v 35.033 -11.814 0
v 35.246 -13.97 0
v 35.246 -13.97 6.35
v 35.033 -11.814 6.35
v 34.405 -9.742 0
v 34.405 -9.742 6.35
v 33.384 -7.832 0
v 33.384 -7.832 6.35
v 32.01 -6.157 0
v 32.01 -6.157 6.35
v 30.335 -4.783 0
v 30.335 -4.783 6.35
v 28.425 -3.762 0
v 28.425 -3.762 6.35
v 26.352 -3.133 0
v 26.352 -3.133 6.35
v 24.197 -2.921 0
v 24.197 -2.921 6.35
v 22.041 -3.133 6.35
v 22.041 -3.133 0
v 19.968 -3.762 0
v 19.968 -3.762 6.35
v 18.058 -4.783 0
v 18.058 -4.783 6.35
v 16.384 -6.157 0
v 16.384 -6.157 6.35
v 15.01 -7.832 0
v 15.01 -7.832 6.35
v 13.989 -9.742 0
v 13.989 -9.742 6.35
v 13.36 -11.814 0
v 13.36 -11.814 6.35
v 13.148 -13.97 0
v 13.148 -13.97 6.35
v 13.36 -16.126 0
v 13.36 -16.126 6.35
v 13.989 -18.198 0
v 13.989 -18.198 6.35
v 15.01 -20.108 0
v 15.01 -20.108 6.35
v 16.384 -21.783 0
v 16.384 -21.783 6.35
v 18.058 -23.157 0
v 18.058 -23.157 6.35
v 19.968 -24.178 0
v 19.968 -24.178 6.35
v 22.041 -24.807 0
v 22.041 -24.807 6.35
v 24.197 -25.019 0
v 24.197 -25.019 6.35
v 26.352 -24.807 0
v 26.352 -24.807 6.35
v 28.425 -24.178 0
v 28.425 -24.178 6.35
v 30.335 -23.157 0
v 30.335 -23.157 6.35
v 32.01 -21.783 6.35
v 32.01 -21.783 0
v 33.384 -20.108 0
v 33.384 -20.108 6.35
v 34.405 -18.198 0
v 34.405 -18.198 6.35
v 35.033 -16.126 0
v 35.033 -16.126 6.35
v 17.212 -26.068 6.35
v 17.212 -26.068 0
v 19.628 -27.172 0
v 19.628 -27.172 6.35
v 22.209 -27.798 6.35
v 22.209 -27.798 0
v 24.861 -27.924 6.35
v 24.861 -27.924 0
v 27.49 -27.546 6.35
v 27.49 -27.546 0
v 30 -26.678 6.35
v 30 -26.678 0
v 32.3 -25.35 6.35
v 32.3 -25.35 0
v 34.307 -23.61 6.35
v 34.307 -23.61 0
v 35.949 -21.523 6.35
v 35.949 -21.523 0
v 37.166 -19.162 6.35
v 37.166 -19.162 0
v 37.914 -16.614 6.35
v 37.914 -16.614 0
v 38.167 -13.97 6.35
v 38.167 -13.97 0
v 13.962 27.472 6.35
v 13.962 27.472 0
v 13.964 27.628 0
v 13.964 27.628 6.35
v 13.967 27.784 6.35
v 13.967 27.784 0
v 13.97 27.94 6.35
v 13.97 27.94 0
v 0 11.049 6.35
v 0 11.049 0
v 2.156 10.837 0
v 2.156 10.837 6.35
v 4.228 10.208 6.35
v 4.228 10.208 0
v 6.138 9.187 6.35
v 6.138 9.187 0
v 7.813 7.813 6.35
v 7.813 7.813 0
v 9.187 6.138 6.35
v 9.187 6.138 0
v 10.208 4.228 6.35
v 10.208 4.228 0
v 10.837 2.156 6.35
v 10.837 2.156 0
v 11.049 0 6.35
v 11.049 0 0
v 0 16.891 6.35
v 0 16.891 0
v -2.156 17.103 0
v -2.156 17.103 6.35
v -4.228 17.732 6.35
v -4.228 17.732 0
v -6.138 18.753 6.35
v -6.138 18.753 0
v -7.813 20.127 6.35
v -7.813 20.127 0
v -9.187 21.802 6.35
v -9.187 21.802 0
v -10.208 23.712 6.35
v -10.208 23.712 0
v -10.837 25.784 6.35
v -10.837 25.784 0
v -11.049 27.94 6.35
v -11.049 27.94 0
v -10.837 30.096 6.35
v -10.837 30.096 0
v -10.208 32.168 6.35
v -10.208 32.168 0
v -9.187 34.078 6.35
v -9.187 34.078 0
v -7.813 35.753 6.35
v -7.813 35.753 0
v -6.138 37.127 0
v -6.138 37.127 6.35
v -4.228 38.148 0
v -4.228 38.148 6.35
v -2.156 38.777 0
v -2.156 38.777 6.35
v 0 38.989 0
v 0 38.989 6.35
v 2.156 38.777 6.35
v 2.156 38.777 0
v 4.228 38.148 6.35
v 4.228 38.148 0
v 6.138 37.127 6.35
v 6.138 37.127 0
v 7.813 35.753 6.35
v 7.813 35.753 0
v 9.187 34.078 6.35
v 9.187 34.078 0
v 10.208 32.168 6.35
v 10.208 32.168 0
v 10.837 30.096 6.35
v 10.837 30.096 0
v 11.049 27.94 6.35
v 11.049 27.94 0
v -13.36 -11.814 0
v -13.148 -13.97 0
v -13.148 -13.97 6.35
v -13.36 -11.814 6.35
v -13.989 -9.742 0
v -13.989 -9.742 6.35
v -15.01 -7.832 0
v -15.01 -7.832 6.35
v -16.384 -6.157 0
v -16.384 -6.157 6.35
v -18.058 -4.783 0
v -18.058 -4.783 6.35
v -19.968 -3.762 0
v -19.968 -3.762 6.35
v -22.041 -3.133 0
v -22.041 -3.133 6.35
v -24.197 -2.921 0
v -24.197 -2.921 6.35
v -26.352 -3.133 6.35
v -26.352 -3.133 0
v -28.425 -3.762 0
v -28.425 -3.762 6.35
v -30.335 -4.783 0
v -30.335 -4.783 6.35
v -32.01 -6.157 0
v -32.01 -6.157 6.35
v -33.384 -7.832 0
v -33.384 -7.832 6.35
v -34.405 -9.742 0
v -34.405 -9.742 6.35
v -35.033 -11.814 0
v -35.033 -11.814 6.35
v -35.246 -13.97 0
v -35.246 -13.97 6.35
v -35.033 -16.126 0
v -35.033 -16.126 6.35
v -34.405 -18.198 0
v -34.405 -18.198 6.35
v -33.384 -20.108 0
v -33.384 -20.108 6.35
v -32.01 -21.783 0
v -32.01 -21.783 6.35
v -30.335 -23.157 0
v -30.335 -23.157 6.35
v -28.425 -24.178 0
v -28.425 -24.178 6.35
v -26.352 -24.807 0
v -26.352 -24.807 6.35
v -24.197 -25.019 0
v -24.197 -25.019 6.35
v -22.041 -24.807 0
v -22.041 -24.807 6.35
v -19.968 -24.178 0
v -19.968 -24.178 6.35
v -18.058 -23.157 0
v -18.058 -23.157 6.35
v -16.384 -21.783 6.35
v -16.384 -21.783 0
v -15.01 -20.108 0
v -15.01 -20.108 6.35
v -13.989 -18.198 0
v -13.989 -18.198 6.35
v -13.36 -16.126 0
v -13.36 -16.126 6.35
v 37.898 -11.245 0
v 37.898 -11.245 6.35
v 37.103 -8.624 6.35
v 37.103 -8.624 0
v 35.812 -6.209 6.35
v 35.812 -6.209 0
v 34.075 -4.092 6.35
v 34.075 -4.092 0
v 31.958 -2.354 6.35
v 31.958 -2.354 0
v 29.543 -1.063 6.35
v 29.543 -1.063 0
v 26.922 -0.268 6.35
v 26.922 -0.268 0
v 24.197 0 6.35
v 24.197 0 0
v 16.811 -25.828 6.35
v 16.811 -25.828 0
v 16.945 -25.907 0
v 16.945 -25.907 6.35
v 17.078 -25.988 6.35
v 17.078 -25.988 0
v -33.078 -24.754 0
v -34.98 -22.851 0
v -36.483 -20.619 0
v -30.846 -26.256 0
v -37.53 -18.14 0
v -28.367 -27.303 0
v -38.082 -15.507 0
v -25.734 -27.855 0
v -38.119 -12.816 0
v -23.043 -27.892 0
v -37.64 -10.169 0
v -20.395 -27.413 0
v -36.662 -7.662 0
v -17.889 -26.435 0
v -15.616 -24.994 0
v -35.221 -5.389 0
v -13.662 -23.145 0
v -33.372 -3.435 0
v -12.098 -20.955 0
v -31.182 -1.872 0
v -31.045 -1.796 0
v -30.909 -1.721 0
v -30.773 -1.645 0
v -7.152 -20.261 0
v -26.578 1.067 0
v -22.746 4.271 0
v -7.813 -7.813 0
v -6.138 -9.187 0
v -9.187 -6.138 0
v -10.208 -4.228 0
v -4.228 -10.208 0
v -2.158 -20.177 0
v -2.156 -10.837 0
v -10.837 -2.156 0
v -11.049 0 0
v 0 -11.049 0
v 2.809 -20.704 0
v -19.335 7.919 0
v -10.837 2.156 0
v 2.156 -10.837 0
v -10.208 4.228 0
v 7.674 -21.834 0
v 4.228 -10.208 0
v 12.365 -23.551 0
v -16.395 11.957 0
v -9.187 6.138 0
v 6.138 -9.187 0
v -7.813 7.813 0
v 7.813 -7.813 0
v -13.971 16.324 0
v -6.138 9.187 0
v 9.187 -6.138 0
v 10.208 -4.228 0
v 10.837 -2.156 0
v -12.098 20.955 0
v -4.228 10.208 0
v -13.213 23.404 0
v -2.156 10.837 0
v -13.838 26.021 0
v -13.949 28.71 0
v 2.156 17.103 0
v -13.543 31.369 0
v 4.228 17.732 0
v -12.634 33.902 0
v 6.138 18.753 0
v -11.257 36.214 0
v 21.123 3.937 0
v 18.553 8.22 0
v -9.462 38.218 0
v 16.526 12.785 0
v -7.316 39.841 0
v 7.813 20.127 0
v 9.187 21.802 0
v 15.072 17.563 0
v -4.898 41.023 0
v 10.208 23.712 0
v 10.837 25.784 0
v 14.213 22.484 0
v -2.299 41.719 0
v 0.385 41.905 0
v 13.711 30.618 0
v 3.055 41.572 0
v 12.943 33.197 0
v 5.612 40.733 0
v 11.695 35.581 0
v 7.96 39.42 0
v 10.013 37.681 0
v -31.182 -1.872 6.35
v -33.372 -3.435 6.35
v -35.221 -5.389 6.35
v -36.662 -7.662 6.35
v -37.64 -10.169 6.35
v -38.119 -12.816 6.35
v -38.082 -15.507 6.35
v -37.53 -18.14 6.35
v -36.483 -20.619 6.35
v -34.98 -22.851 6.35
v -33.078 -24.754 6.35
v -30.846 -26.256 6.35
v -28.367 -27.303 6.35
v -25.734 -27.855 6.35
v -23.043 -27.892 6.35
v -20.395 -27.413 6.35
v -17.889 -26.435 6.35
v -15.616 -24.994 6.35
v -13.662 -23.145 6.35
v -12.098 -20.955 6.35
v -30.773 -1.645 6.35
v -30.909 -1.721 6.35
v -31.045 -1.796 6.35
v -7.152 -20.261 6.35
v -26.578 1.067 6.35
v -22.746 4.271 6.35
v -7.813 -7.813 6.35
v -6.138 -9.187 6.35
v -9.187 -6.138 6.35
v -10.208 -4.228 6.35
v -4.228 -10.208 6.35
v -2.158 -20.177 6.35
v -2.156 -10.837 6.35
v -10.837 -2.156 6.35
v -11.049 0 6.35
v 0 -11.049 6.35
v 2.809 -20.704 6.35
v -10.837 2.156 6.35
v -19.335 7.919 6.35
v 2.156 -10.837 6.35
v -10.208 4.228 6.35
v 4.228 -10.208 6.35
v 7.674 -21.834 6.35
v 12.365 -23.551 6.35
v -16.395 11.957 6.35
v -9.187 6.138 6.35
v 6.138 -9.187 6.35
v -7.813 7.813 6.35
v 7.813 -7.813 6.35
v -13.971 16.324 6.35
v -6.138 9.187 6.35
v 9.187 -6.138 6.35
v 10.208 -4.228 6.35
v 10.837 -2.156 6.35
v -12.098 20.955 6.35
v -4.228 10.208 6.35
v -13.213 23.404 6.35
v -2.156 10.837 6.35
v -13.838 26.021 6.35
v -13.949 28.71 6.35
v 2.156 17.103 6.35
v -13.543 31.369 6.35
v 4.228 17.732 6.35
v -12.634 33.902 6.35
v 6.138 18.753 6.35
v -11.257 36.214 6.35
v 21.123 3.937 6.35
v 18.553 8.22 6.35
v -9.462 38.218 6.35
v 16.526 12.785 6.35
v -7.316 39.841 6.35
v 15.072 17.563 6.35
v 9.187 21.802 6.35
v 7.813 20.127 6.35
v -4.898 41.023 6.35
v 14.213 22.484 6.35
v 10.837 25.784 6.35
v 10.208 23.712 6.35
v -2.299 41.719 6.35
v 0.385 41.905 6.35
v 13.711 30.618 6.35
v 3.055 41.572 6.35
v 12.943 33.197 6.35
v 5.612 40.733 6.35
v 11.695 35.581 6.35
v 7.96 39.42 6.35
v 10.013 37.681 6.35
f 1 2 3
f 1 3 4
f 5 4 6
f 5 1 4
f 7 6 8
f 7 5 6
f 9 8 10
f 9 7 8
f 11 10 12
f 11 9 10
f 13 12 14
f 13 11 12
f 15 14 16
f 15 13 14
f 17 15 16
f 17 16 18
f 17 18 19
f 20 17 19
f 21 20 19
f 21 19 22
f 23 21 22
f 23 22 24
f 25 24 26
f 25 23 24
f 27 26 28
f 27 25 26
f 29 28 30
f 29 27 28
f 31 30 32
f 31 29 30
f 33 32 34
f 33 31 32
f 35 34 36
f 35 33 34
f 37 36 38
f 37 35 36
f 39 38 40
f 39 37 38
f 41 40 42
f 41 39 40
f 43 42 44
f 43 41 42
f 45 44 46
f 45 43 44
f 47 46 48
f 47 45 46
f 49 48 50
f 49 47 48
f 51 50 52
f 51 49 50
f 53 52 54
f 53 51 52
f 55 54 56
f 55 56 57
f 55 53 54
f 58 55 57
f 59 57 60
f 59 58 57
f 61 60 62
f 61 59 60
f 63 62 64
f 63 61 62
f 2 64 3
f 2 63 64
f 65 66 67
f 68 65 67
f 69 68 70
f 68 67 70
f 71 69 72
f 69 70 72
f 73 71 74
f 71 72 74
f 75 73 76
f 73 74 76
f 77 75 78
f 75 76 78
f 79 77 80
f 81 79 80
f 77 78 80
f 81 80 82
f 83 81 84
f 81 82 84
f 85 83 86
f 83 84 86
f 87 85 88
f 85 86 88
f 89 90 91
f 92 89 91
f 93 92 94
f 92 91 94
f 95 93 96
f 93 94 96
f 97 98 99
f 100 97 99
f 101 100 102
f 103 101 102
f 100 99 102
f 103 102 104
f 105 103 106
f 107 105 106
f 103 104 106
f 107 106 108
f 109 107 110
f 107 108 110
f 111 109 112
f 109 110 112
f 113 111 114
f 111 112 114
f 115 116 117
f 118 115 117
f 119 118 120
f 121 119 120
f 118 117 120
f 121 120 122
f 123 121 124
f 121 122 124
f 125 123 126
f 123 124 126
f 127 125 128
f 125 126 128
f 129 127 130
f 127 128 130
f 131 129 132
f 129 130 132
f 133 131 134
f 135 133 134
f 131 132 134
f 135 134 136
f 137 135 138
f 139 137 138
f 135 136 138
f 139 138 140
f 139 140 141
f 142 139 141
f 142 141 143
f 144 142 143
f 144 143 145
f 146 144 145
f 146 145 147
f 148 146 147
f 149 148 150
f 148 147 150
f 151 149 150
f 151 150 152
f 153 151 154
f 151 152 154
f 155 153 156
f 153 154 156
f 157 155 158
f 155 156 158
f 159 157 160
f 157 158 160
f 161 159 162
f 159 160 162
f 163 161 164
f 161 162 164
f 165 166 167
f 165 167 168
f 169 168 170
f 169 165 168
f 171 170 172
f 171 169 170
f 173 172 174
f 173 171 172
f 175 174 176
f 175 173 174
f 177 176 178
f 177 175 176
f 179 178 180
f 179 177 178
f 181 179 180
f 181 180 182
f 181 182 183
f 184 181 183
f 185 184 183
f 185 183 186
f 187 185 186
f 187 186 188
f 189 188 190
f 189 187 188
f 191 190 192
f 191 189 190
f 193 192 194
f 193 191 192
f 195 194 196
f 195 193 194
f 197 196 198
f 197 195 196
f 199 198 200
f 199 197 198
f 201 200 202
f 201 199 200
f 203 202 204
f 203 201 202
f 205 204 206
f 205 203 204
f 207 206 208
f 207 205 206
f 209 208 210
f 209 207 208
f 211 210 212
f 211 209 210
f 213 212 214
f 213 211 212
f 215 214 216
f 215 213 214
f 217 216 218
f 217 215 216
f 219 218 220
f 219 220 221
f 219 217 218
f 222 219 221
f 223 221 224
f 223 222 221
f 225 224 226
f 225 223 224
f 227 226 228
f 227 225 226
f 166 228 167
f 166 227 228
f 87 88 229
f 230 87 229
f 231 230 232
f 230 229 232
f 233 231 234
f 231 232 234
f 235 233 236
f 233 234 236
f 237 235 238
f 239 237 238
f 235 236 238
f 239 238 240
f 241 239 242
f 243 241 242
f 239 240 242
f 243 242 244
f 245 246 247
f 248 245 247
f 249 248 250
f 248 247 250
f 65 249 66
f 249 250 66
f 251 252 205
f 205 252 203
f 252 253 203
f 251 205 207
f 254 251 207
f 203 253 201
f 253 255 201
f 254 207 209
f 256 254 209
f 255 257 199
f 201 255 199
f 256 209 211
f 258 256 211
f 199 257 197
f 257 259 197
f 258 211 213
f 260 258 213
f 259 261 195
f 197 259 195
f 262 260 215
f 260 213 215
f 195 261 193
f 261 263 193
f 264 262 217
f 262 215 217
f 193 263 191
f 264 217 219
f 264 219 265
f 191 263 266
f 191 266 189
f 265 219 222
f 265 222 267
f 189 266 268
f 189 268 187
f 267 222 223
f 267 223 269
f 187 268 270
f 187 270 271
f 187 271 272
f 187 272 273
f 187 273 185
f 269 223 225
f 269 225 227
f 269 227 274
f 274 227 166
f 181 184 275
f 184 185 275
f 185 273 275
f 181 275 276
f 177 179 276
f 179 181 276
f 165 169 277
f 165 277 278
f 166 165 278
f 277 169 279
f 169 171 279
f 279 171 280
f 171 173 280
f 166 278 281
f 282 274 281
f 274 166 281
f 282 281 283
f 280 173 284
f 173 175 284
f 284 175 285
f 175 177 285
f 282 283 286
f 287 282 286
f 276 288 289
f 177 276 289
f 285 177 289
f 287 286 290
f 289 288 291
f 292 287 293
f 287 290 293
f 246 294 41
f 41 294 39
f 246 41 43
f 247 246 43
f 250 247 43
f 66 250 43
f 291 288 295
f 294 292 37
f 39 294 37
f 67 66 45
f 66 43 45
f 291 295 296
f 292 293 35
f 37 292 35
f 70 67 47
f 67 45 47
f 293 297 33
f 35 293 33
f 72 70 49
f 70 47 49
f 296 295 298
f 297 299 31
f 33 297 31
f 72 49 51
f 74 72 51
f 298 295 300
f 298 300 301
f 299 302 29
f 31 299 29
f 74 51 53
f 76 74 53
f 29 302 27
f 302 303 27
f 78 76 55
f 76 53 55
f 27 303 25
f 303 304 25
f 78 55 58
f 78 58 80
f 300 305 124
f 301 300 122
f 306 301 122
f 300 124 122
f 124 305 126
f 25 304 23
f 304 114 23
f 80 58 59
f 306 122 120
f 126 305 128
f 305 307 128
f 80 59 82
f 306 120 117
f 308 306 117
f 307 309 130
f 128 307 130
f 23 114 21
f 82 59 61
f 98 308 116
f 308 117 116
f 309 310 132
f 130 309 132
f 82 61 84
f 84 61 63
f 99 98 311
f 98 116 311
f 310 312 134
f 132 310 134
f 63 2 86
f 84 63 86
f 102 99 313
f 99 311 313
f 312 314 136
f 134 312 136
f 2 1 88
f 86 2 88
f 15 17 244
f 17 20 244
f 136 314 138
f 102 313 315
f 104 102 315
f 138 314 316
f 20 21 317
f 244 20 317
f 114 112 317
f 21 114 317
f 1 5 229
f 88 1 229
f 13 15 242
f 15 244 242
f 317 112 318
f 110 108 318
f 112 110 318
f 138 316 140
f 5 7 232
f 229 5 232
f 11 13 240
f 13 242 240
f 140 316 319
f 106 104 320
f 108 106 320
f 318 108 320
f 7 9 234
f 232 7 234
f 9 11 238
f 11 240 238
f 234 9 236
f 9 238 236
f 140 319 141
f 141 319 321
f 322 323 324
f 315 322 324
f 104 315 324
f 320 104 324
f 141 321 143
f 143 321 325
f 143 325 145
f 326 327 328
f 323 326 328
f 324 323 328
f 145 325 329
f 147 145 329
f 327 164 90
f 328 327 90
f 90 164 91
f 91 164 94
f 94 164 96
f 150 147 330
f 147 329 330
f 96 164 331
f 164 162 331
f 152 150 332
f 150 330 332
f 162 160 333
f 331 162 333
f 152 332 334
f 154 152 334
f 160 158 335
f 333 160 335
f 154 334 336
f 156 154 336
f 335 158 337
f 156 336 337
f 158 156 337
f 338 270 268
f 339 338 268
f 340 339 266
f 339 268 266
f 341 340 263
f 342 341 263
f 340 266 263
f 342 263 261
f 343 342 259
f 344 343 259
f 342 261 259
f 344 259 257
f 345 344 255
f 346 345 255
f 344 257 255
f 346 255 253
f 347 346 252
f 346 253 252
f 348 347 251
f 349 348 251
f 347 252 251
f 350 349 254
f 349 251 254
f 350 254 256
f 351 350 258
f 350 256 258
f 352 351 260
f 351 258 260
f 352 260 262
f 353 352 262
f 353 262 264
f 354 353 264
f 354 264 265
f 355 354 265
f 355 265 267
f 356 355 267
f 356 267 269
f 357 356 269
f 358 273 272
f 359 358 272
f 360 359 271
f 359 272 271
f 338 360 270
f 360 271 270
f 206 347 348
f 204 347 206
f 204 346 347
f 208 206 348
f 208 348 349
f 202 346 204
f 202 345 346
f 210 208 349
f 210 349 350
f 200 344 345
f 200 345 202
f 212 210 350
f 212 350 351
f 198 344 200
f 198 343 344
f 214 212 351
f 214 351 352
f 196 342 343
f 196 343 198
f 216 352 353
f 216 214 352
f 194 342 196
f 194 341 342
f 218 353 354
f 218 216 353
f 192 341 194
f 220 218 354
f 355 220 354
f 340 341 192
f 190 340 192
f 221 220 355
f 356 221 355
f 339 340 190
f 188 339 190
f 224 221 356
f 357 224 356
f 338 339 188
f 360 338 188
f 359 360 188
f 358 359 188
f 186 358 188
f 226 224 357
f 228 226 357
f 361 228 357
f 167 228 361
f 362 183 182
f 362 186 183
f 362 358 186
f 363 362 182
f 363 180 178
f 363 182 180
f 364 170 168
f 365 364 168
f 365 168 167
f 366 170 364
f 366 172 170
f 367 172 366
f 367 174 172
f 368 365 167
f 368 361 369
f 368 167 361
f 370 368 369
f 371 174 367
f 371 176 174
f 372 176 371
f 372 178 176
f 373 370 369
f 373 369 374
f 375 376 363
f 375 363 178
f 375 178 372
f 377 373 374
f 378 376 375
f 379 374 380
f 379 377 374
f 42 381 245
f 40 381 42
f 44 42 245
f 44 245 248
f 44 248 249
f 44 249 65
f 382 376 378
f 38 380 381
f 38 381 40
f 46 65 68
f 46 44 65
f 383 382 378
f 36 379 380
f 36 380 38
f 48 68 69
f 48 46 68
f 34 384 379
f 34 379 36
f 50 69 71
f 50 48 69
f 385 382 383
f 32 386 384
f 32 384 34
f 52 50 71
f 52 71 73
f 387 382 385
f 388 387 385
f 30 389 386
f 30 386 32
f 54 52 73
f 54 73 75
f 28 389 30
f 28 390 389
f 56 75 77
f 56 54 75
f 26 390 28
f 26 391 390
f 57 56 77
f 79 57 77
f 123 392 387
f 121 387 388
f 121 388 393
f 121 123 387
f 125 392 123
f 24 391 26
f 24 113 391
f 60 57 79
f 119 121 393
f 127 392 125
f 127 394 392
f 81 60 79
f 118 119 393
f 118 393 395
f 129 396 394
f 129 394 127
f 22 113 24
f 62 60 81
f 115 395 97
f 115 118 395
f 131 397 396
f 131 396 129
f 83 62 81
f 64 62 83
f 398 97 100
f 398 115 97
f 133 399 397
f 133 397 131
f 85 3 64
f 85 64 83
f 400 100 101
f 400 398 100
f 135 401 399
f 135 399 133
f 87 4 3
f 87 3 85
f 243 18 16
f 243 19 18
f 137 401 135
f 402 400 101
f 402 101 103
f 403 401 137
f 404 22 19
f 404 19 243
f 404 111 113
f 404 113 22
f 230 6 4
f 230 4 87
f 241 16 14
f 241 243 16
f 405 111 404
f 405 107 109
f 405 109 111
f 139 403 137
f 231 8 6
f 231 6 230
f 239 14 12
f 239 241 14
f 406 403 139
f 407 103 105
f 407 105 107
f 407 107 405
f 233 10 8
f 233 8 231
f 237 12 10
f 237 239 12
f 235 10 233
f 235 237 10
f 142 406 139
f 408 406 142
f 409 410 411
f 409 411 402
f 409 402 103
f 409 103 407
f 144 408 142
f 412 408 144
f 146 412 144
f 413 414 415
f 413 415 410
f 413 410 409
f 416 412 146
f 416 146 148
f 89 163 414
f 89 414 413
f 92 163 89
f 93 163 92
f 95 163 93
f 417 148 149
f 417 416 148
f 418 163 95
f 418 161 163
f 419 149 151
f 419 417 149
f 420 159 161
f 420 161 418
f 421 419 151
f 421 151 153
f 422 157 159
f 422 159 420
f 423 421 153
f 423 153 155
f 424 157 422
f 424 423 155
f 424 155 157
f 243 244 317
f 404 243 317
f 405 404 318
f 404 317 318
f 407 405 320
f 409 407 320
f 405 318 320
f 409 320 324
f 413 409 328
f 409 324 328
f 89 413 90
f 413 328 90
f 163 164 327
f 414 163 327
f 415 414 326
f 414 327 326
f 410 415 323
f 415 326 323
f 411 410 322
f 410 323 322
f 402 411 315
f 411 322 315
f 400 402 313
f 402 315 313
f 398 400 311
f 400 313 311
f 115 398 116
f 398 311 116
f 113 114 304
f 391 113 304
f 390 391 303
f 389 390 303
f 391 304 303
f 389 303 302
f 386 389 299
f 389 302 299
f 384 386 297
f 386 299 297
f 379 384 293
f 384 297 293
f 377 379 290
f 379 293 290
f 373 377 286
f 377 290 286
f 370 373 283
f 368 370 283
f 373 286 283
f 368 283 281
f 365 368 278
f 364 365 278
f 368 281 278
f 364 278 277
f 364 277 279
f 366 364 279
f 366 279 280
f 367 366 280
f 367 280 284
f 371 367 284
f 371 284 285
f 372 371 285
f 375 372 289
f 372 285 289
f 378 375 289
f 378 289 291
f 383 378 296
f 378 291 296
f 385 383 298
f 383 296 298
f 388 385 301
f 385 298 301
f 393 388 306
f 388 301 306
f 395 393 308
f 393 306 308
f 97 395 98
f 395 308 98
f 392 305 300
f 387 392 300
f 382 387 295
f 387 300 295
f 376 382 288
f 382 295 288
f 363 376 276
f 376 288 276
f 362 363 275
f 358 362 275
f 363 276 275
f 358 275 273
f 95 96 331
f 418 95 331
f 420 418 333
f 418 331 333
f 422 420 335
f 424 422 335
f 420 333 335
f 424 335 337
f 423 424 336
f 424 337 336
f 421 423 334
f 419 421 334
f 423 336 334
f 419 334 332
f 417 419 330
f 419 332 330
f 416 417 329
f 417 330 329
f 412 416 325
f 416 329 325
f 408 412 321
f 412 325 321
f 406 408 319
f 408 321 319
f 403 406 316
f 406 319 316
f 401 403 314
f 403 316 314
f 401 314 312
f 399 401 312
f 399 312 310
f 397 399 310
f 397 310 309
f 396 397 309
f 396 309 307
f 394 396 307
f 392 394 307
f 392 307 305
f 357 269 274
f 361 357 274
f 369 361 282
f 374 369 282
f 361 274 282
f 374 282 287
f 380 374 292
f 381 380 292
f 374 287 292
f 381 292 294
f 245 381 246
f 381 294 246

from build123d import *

# Parameters (mm, degrees)
F1_R     = 11.049
F2_DEPTH = 6.35


with BuildPart() as f2:
    # F1 (on face) → F2 (new body)
    with BuildSketch(Plane.XY):
        with BuildLine():
            ThreePointArc((13.9621660883, 27.472220007), (13.9654123098, 27.7061212363), (13.97, 27.94))
            ThreePointArc((13.97, 27.94), (-3.6157020601, 41.4339837933), (-12.0983748909, 20.955))
            ThreePointArc((-12.0983748909, 20.955), (-6.9849999951, 15.8416251063), (1.14e-08, 13.97))
            ThreePointArc((1.14e-08, 13.97), (9.7114883941, 17.8976948278), (13.9621660883, 27.472220007))
        make_face()
        with BuildLine():
            ThreePointArc((11.049, 27.94), (7.8128228253, 20.1271771747), (0, 16.891))
            ThreePointArc((0, 16.891), (-7.8128228253, 35.7528228253), (11.049, 27.94))
        make_face(mode=Mode.SUBTRACT)
        with BuildLine():
            ThreePointArc((1.14e-08, 13.97), (-6.9849999951, 15.8416251063), (-12.0983748909, 20.955))
            ThreePointArc((-12.0983748909, 20.955), (-19.3348001595, 7.9193573575), (-30.7727234686, -1.6445194791))
            ThreePointArc((-30.7727234686, -1.6445194791), (-20.3556031034, -0.5384516084), (-12.0983754336, -6.98499906))
            ThreePointArc((-12.0983754336, -6.98499906), (-12.0983746167, 6.9850004749), (1.14e-08, 13.97))
        make_face()
        with BuildLine():
            ThreePointArc((24.1967497817, 0), (16.525764733, 12.7847494365), (13.9621660883, 27.472220007))
            ThreePointArc((13.9621660883, 27.472220007), (9.7114883941, 17.8976948278), (1.14e-08, 13.97))
            ThreePointArc((1.14e-08, 13.97), (9.8782817372, 9.8782817292), (13.97, 0))
            ThreePointArc((13.97, 0), (13.4939839355, -3.6157015292), (12.0983754405, -6.984999048))
            ThreePointArc((12.0983754405, -6.984999048), (17.2117502577, -1.8716248343), (24.1967497817, 0))
        make_face()
        with BuildLine():
            ThreePointArc((13.97, 0), (9.8782817372, 9.8782817292), (1.14e-08, 13.97))
            ThreePointArc((1.14e-08, 13.97), (-12.0983746167, 6.9850004749), (-12.0983754336, -6.98499906))
            ThreePointArc((-12.0983754336, -6.98499906), (6.9e-09, -13.97), (12.0983754405, -6.984999048))
            ThreePointArc((12.0983754405, -6.984999048), (13.4939839355, -3.6157015292), (13.97, 0))
        make_face()
        with BuildLine():
            ThreePointArc((11.049, 0), (-7.8128228253, -7.8128228253), (0, 11.049))
            ThreePointArc((0, 11.049), (7.8128228253, 7.8128228253), (11.049, 0))
        make_face(mode=Mode.SUBTRACT)
        with BuildLine():
            ThreePointArc((-12.0983754336, -6.98499906), (-20.3556031034, -0.5384516084), (-30.7727234686, -1.6445194791))
            ThreePointArc((-30.7727234686, -1.6445194791), (-30.9769109858, -1.7586587835), (-31.1817497817, -1.8716251091))
            ThreePointArc((-31.1817497817, -1.8716251091), (-34.0750315149, -23.8482817332), (-12.0983748909, -20.955))
            ThreePointArc((-12.0983748909, -20.955), (-10.7027659885, -17.5857020601), (-10.2267497817, -13.97))
            ThreePointArc((-10.2267497817, -13.97), (-10.7027661289, -10.3542974157), (-12.0983754336, -6.98499906))
        make_face()
        with Locations((-24.1967497817, -13.97)):
            Circle(F1_R, mode=Mode.SUBTRACT)
        with BuildLine():
            ThreePointArc((38.1667497817, -13.97), (34.0750315149, -4.0917182668), (24.1967497817, 0))
            ThreePointArc((24.1967497817, 0), (17.2117502577, -1.8716248343), (12.0983754405, -6.984999048))
            ThreePointArc((12.0983754405, -6.984999048), (10.6441140583, -17.359242533), (16.8105573802, -25.8277005278))
            ThreePointArc((16.8105573802, -25.8277005278), (17.0114986761, -25.9474624527), (17.2117497817, -26.0683748909))
            ThreePointArc((17.2117497817, -26.0683748909), (31.1817497817, -26.0683748909), (38.1667497817, -13.97))
        make_face()
        with Locations((24.1967497817, -13.97)):
            Circle(F1_R, mode=Mode.SUBTRACT)
        with BuildLine():
            ThreePointArc((12.0983754405, -6.984999048), (6.9e-09, -13.97), (-12.0983754336, -6.98499906))
            ThreePointArc((-12.0983754336, -6.98499906), (-10.7027661289, -10.3542974157), (-10.2267497817, -13.97))
            ThreePointArc((-10.2267497817, -13.97), (-10.7027659885, -17.5857020601), (-12.0983748909, -20.955))
            ThreePointArc((-12.0983748909, -20.955), (2.8090354265, -20.704106794), (16.8105573802, -25.8277005278))
            ThreePointArc((16.8105573802, -25.8277005278), (10.6441140583, -17.359242533), (12.0983754405, -6.984999048))
        make_face()
    extrude(amount=F2_DEPTH)


solid = f2.part
